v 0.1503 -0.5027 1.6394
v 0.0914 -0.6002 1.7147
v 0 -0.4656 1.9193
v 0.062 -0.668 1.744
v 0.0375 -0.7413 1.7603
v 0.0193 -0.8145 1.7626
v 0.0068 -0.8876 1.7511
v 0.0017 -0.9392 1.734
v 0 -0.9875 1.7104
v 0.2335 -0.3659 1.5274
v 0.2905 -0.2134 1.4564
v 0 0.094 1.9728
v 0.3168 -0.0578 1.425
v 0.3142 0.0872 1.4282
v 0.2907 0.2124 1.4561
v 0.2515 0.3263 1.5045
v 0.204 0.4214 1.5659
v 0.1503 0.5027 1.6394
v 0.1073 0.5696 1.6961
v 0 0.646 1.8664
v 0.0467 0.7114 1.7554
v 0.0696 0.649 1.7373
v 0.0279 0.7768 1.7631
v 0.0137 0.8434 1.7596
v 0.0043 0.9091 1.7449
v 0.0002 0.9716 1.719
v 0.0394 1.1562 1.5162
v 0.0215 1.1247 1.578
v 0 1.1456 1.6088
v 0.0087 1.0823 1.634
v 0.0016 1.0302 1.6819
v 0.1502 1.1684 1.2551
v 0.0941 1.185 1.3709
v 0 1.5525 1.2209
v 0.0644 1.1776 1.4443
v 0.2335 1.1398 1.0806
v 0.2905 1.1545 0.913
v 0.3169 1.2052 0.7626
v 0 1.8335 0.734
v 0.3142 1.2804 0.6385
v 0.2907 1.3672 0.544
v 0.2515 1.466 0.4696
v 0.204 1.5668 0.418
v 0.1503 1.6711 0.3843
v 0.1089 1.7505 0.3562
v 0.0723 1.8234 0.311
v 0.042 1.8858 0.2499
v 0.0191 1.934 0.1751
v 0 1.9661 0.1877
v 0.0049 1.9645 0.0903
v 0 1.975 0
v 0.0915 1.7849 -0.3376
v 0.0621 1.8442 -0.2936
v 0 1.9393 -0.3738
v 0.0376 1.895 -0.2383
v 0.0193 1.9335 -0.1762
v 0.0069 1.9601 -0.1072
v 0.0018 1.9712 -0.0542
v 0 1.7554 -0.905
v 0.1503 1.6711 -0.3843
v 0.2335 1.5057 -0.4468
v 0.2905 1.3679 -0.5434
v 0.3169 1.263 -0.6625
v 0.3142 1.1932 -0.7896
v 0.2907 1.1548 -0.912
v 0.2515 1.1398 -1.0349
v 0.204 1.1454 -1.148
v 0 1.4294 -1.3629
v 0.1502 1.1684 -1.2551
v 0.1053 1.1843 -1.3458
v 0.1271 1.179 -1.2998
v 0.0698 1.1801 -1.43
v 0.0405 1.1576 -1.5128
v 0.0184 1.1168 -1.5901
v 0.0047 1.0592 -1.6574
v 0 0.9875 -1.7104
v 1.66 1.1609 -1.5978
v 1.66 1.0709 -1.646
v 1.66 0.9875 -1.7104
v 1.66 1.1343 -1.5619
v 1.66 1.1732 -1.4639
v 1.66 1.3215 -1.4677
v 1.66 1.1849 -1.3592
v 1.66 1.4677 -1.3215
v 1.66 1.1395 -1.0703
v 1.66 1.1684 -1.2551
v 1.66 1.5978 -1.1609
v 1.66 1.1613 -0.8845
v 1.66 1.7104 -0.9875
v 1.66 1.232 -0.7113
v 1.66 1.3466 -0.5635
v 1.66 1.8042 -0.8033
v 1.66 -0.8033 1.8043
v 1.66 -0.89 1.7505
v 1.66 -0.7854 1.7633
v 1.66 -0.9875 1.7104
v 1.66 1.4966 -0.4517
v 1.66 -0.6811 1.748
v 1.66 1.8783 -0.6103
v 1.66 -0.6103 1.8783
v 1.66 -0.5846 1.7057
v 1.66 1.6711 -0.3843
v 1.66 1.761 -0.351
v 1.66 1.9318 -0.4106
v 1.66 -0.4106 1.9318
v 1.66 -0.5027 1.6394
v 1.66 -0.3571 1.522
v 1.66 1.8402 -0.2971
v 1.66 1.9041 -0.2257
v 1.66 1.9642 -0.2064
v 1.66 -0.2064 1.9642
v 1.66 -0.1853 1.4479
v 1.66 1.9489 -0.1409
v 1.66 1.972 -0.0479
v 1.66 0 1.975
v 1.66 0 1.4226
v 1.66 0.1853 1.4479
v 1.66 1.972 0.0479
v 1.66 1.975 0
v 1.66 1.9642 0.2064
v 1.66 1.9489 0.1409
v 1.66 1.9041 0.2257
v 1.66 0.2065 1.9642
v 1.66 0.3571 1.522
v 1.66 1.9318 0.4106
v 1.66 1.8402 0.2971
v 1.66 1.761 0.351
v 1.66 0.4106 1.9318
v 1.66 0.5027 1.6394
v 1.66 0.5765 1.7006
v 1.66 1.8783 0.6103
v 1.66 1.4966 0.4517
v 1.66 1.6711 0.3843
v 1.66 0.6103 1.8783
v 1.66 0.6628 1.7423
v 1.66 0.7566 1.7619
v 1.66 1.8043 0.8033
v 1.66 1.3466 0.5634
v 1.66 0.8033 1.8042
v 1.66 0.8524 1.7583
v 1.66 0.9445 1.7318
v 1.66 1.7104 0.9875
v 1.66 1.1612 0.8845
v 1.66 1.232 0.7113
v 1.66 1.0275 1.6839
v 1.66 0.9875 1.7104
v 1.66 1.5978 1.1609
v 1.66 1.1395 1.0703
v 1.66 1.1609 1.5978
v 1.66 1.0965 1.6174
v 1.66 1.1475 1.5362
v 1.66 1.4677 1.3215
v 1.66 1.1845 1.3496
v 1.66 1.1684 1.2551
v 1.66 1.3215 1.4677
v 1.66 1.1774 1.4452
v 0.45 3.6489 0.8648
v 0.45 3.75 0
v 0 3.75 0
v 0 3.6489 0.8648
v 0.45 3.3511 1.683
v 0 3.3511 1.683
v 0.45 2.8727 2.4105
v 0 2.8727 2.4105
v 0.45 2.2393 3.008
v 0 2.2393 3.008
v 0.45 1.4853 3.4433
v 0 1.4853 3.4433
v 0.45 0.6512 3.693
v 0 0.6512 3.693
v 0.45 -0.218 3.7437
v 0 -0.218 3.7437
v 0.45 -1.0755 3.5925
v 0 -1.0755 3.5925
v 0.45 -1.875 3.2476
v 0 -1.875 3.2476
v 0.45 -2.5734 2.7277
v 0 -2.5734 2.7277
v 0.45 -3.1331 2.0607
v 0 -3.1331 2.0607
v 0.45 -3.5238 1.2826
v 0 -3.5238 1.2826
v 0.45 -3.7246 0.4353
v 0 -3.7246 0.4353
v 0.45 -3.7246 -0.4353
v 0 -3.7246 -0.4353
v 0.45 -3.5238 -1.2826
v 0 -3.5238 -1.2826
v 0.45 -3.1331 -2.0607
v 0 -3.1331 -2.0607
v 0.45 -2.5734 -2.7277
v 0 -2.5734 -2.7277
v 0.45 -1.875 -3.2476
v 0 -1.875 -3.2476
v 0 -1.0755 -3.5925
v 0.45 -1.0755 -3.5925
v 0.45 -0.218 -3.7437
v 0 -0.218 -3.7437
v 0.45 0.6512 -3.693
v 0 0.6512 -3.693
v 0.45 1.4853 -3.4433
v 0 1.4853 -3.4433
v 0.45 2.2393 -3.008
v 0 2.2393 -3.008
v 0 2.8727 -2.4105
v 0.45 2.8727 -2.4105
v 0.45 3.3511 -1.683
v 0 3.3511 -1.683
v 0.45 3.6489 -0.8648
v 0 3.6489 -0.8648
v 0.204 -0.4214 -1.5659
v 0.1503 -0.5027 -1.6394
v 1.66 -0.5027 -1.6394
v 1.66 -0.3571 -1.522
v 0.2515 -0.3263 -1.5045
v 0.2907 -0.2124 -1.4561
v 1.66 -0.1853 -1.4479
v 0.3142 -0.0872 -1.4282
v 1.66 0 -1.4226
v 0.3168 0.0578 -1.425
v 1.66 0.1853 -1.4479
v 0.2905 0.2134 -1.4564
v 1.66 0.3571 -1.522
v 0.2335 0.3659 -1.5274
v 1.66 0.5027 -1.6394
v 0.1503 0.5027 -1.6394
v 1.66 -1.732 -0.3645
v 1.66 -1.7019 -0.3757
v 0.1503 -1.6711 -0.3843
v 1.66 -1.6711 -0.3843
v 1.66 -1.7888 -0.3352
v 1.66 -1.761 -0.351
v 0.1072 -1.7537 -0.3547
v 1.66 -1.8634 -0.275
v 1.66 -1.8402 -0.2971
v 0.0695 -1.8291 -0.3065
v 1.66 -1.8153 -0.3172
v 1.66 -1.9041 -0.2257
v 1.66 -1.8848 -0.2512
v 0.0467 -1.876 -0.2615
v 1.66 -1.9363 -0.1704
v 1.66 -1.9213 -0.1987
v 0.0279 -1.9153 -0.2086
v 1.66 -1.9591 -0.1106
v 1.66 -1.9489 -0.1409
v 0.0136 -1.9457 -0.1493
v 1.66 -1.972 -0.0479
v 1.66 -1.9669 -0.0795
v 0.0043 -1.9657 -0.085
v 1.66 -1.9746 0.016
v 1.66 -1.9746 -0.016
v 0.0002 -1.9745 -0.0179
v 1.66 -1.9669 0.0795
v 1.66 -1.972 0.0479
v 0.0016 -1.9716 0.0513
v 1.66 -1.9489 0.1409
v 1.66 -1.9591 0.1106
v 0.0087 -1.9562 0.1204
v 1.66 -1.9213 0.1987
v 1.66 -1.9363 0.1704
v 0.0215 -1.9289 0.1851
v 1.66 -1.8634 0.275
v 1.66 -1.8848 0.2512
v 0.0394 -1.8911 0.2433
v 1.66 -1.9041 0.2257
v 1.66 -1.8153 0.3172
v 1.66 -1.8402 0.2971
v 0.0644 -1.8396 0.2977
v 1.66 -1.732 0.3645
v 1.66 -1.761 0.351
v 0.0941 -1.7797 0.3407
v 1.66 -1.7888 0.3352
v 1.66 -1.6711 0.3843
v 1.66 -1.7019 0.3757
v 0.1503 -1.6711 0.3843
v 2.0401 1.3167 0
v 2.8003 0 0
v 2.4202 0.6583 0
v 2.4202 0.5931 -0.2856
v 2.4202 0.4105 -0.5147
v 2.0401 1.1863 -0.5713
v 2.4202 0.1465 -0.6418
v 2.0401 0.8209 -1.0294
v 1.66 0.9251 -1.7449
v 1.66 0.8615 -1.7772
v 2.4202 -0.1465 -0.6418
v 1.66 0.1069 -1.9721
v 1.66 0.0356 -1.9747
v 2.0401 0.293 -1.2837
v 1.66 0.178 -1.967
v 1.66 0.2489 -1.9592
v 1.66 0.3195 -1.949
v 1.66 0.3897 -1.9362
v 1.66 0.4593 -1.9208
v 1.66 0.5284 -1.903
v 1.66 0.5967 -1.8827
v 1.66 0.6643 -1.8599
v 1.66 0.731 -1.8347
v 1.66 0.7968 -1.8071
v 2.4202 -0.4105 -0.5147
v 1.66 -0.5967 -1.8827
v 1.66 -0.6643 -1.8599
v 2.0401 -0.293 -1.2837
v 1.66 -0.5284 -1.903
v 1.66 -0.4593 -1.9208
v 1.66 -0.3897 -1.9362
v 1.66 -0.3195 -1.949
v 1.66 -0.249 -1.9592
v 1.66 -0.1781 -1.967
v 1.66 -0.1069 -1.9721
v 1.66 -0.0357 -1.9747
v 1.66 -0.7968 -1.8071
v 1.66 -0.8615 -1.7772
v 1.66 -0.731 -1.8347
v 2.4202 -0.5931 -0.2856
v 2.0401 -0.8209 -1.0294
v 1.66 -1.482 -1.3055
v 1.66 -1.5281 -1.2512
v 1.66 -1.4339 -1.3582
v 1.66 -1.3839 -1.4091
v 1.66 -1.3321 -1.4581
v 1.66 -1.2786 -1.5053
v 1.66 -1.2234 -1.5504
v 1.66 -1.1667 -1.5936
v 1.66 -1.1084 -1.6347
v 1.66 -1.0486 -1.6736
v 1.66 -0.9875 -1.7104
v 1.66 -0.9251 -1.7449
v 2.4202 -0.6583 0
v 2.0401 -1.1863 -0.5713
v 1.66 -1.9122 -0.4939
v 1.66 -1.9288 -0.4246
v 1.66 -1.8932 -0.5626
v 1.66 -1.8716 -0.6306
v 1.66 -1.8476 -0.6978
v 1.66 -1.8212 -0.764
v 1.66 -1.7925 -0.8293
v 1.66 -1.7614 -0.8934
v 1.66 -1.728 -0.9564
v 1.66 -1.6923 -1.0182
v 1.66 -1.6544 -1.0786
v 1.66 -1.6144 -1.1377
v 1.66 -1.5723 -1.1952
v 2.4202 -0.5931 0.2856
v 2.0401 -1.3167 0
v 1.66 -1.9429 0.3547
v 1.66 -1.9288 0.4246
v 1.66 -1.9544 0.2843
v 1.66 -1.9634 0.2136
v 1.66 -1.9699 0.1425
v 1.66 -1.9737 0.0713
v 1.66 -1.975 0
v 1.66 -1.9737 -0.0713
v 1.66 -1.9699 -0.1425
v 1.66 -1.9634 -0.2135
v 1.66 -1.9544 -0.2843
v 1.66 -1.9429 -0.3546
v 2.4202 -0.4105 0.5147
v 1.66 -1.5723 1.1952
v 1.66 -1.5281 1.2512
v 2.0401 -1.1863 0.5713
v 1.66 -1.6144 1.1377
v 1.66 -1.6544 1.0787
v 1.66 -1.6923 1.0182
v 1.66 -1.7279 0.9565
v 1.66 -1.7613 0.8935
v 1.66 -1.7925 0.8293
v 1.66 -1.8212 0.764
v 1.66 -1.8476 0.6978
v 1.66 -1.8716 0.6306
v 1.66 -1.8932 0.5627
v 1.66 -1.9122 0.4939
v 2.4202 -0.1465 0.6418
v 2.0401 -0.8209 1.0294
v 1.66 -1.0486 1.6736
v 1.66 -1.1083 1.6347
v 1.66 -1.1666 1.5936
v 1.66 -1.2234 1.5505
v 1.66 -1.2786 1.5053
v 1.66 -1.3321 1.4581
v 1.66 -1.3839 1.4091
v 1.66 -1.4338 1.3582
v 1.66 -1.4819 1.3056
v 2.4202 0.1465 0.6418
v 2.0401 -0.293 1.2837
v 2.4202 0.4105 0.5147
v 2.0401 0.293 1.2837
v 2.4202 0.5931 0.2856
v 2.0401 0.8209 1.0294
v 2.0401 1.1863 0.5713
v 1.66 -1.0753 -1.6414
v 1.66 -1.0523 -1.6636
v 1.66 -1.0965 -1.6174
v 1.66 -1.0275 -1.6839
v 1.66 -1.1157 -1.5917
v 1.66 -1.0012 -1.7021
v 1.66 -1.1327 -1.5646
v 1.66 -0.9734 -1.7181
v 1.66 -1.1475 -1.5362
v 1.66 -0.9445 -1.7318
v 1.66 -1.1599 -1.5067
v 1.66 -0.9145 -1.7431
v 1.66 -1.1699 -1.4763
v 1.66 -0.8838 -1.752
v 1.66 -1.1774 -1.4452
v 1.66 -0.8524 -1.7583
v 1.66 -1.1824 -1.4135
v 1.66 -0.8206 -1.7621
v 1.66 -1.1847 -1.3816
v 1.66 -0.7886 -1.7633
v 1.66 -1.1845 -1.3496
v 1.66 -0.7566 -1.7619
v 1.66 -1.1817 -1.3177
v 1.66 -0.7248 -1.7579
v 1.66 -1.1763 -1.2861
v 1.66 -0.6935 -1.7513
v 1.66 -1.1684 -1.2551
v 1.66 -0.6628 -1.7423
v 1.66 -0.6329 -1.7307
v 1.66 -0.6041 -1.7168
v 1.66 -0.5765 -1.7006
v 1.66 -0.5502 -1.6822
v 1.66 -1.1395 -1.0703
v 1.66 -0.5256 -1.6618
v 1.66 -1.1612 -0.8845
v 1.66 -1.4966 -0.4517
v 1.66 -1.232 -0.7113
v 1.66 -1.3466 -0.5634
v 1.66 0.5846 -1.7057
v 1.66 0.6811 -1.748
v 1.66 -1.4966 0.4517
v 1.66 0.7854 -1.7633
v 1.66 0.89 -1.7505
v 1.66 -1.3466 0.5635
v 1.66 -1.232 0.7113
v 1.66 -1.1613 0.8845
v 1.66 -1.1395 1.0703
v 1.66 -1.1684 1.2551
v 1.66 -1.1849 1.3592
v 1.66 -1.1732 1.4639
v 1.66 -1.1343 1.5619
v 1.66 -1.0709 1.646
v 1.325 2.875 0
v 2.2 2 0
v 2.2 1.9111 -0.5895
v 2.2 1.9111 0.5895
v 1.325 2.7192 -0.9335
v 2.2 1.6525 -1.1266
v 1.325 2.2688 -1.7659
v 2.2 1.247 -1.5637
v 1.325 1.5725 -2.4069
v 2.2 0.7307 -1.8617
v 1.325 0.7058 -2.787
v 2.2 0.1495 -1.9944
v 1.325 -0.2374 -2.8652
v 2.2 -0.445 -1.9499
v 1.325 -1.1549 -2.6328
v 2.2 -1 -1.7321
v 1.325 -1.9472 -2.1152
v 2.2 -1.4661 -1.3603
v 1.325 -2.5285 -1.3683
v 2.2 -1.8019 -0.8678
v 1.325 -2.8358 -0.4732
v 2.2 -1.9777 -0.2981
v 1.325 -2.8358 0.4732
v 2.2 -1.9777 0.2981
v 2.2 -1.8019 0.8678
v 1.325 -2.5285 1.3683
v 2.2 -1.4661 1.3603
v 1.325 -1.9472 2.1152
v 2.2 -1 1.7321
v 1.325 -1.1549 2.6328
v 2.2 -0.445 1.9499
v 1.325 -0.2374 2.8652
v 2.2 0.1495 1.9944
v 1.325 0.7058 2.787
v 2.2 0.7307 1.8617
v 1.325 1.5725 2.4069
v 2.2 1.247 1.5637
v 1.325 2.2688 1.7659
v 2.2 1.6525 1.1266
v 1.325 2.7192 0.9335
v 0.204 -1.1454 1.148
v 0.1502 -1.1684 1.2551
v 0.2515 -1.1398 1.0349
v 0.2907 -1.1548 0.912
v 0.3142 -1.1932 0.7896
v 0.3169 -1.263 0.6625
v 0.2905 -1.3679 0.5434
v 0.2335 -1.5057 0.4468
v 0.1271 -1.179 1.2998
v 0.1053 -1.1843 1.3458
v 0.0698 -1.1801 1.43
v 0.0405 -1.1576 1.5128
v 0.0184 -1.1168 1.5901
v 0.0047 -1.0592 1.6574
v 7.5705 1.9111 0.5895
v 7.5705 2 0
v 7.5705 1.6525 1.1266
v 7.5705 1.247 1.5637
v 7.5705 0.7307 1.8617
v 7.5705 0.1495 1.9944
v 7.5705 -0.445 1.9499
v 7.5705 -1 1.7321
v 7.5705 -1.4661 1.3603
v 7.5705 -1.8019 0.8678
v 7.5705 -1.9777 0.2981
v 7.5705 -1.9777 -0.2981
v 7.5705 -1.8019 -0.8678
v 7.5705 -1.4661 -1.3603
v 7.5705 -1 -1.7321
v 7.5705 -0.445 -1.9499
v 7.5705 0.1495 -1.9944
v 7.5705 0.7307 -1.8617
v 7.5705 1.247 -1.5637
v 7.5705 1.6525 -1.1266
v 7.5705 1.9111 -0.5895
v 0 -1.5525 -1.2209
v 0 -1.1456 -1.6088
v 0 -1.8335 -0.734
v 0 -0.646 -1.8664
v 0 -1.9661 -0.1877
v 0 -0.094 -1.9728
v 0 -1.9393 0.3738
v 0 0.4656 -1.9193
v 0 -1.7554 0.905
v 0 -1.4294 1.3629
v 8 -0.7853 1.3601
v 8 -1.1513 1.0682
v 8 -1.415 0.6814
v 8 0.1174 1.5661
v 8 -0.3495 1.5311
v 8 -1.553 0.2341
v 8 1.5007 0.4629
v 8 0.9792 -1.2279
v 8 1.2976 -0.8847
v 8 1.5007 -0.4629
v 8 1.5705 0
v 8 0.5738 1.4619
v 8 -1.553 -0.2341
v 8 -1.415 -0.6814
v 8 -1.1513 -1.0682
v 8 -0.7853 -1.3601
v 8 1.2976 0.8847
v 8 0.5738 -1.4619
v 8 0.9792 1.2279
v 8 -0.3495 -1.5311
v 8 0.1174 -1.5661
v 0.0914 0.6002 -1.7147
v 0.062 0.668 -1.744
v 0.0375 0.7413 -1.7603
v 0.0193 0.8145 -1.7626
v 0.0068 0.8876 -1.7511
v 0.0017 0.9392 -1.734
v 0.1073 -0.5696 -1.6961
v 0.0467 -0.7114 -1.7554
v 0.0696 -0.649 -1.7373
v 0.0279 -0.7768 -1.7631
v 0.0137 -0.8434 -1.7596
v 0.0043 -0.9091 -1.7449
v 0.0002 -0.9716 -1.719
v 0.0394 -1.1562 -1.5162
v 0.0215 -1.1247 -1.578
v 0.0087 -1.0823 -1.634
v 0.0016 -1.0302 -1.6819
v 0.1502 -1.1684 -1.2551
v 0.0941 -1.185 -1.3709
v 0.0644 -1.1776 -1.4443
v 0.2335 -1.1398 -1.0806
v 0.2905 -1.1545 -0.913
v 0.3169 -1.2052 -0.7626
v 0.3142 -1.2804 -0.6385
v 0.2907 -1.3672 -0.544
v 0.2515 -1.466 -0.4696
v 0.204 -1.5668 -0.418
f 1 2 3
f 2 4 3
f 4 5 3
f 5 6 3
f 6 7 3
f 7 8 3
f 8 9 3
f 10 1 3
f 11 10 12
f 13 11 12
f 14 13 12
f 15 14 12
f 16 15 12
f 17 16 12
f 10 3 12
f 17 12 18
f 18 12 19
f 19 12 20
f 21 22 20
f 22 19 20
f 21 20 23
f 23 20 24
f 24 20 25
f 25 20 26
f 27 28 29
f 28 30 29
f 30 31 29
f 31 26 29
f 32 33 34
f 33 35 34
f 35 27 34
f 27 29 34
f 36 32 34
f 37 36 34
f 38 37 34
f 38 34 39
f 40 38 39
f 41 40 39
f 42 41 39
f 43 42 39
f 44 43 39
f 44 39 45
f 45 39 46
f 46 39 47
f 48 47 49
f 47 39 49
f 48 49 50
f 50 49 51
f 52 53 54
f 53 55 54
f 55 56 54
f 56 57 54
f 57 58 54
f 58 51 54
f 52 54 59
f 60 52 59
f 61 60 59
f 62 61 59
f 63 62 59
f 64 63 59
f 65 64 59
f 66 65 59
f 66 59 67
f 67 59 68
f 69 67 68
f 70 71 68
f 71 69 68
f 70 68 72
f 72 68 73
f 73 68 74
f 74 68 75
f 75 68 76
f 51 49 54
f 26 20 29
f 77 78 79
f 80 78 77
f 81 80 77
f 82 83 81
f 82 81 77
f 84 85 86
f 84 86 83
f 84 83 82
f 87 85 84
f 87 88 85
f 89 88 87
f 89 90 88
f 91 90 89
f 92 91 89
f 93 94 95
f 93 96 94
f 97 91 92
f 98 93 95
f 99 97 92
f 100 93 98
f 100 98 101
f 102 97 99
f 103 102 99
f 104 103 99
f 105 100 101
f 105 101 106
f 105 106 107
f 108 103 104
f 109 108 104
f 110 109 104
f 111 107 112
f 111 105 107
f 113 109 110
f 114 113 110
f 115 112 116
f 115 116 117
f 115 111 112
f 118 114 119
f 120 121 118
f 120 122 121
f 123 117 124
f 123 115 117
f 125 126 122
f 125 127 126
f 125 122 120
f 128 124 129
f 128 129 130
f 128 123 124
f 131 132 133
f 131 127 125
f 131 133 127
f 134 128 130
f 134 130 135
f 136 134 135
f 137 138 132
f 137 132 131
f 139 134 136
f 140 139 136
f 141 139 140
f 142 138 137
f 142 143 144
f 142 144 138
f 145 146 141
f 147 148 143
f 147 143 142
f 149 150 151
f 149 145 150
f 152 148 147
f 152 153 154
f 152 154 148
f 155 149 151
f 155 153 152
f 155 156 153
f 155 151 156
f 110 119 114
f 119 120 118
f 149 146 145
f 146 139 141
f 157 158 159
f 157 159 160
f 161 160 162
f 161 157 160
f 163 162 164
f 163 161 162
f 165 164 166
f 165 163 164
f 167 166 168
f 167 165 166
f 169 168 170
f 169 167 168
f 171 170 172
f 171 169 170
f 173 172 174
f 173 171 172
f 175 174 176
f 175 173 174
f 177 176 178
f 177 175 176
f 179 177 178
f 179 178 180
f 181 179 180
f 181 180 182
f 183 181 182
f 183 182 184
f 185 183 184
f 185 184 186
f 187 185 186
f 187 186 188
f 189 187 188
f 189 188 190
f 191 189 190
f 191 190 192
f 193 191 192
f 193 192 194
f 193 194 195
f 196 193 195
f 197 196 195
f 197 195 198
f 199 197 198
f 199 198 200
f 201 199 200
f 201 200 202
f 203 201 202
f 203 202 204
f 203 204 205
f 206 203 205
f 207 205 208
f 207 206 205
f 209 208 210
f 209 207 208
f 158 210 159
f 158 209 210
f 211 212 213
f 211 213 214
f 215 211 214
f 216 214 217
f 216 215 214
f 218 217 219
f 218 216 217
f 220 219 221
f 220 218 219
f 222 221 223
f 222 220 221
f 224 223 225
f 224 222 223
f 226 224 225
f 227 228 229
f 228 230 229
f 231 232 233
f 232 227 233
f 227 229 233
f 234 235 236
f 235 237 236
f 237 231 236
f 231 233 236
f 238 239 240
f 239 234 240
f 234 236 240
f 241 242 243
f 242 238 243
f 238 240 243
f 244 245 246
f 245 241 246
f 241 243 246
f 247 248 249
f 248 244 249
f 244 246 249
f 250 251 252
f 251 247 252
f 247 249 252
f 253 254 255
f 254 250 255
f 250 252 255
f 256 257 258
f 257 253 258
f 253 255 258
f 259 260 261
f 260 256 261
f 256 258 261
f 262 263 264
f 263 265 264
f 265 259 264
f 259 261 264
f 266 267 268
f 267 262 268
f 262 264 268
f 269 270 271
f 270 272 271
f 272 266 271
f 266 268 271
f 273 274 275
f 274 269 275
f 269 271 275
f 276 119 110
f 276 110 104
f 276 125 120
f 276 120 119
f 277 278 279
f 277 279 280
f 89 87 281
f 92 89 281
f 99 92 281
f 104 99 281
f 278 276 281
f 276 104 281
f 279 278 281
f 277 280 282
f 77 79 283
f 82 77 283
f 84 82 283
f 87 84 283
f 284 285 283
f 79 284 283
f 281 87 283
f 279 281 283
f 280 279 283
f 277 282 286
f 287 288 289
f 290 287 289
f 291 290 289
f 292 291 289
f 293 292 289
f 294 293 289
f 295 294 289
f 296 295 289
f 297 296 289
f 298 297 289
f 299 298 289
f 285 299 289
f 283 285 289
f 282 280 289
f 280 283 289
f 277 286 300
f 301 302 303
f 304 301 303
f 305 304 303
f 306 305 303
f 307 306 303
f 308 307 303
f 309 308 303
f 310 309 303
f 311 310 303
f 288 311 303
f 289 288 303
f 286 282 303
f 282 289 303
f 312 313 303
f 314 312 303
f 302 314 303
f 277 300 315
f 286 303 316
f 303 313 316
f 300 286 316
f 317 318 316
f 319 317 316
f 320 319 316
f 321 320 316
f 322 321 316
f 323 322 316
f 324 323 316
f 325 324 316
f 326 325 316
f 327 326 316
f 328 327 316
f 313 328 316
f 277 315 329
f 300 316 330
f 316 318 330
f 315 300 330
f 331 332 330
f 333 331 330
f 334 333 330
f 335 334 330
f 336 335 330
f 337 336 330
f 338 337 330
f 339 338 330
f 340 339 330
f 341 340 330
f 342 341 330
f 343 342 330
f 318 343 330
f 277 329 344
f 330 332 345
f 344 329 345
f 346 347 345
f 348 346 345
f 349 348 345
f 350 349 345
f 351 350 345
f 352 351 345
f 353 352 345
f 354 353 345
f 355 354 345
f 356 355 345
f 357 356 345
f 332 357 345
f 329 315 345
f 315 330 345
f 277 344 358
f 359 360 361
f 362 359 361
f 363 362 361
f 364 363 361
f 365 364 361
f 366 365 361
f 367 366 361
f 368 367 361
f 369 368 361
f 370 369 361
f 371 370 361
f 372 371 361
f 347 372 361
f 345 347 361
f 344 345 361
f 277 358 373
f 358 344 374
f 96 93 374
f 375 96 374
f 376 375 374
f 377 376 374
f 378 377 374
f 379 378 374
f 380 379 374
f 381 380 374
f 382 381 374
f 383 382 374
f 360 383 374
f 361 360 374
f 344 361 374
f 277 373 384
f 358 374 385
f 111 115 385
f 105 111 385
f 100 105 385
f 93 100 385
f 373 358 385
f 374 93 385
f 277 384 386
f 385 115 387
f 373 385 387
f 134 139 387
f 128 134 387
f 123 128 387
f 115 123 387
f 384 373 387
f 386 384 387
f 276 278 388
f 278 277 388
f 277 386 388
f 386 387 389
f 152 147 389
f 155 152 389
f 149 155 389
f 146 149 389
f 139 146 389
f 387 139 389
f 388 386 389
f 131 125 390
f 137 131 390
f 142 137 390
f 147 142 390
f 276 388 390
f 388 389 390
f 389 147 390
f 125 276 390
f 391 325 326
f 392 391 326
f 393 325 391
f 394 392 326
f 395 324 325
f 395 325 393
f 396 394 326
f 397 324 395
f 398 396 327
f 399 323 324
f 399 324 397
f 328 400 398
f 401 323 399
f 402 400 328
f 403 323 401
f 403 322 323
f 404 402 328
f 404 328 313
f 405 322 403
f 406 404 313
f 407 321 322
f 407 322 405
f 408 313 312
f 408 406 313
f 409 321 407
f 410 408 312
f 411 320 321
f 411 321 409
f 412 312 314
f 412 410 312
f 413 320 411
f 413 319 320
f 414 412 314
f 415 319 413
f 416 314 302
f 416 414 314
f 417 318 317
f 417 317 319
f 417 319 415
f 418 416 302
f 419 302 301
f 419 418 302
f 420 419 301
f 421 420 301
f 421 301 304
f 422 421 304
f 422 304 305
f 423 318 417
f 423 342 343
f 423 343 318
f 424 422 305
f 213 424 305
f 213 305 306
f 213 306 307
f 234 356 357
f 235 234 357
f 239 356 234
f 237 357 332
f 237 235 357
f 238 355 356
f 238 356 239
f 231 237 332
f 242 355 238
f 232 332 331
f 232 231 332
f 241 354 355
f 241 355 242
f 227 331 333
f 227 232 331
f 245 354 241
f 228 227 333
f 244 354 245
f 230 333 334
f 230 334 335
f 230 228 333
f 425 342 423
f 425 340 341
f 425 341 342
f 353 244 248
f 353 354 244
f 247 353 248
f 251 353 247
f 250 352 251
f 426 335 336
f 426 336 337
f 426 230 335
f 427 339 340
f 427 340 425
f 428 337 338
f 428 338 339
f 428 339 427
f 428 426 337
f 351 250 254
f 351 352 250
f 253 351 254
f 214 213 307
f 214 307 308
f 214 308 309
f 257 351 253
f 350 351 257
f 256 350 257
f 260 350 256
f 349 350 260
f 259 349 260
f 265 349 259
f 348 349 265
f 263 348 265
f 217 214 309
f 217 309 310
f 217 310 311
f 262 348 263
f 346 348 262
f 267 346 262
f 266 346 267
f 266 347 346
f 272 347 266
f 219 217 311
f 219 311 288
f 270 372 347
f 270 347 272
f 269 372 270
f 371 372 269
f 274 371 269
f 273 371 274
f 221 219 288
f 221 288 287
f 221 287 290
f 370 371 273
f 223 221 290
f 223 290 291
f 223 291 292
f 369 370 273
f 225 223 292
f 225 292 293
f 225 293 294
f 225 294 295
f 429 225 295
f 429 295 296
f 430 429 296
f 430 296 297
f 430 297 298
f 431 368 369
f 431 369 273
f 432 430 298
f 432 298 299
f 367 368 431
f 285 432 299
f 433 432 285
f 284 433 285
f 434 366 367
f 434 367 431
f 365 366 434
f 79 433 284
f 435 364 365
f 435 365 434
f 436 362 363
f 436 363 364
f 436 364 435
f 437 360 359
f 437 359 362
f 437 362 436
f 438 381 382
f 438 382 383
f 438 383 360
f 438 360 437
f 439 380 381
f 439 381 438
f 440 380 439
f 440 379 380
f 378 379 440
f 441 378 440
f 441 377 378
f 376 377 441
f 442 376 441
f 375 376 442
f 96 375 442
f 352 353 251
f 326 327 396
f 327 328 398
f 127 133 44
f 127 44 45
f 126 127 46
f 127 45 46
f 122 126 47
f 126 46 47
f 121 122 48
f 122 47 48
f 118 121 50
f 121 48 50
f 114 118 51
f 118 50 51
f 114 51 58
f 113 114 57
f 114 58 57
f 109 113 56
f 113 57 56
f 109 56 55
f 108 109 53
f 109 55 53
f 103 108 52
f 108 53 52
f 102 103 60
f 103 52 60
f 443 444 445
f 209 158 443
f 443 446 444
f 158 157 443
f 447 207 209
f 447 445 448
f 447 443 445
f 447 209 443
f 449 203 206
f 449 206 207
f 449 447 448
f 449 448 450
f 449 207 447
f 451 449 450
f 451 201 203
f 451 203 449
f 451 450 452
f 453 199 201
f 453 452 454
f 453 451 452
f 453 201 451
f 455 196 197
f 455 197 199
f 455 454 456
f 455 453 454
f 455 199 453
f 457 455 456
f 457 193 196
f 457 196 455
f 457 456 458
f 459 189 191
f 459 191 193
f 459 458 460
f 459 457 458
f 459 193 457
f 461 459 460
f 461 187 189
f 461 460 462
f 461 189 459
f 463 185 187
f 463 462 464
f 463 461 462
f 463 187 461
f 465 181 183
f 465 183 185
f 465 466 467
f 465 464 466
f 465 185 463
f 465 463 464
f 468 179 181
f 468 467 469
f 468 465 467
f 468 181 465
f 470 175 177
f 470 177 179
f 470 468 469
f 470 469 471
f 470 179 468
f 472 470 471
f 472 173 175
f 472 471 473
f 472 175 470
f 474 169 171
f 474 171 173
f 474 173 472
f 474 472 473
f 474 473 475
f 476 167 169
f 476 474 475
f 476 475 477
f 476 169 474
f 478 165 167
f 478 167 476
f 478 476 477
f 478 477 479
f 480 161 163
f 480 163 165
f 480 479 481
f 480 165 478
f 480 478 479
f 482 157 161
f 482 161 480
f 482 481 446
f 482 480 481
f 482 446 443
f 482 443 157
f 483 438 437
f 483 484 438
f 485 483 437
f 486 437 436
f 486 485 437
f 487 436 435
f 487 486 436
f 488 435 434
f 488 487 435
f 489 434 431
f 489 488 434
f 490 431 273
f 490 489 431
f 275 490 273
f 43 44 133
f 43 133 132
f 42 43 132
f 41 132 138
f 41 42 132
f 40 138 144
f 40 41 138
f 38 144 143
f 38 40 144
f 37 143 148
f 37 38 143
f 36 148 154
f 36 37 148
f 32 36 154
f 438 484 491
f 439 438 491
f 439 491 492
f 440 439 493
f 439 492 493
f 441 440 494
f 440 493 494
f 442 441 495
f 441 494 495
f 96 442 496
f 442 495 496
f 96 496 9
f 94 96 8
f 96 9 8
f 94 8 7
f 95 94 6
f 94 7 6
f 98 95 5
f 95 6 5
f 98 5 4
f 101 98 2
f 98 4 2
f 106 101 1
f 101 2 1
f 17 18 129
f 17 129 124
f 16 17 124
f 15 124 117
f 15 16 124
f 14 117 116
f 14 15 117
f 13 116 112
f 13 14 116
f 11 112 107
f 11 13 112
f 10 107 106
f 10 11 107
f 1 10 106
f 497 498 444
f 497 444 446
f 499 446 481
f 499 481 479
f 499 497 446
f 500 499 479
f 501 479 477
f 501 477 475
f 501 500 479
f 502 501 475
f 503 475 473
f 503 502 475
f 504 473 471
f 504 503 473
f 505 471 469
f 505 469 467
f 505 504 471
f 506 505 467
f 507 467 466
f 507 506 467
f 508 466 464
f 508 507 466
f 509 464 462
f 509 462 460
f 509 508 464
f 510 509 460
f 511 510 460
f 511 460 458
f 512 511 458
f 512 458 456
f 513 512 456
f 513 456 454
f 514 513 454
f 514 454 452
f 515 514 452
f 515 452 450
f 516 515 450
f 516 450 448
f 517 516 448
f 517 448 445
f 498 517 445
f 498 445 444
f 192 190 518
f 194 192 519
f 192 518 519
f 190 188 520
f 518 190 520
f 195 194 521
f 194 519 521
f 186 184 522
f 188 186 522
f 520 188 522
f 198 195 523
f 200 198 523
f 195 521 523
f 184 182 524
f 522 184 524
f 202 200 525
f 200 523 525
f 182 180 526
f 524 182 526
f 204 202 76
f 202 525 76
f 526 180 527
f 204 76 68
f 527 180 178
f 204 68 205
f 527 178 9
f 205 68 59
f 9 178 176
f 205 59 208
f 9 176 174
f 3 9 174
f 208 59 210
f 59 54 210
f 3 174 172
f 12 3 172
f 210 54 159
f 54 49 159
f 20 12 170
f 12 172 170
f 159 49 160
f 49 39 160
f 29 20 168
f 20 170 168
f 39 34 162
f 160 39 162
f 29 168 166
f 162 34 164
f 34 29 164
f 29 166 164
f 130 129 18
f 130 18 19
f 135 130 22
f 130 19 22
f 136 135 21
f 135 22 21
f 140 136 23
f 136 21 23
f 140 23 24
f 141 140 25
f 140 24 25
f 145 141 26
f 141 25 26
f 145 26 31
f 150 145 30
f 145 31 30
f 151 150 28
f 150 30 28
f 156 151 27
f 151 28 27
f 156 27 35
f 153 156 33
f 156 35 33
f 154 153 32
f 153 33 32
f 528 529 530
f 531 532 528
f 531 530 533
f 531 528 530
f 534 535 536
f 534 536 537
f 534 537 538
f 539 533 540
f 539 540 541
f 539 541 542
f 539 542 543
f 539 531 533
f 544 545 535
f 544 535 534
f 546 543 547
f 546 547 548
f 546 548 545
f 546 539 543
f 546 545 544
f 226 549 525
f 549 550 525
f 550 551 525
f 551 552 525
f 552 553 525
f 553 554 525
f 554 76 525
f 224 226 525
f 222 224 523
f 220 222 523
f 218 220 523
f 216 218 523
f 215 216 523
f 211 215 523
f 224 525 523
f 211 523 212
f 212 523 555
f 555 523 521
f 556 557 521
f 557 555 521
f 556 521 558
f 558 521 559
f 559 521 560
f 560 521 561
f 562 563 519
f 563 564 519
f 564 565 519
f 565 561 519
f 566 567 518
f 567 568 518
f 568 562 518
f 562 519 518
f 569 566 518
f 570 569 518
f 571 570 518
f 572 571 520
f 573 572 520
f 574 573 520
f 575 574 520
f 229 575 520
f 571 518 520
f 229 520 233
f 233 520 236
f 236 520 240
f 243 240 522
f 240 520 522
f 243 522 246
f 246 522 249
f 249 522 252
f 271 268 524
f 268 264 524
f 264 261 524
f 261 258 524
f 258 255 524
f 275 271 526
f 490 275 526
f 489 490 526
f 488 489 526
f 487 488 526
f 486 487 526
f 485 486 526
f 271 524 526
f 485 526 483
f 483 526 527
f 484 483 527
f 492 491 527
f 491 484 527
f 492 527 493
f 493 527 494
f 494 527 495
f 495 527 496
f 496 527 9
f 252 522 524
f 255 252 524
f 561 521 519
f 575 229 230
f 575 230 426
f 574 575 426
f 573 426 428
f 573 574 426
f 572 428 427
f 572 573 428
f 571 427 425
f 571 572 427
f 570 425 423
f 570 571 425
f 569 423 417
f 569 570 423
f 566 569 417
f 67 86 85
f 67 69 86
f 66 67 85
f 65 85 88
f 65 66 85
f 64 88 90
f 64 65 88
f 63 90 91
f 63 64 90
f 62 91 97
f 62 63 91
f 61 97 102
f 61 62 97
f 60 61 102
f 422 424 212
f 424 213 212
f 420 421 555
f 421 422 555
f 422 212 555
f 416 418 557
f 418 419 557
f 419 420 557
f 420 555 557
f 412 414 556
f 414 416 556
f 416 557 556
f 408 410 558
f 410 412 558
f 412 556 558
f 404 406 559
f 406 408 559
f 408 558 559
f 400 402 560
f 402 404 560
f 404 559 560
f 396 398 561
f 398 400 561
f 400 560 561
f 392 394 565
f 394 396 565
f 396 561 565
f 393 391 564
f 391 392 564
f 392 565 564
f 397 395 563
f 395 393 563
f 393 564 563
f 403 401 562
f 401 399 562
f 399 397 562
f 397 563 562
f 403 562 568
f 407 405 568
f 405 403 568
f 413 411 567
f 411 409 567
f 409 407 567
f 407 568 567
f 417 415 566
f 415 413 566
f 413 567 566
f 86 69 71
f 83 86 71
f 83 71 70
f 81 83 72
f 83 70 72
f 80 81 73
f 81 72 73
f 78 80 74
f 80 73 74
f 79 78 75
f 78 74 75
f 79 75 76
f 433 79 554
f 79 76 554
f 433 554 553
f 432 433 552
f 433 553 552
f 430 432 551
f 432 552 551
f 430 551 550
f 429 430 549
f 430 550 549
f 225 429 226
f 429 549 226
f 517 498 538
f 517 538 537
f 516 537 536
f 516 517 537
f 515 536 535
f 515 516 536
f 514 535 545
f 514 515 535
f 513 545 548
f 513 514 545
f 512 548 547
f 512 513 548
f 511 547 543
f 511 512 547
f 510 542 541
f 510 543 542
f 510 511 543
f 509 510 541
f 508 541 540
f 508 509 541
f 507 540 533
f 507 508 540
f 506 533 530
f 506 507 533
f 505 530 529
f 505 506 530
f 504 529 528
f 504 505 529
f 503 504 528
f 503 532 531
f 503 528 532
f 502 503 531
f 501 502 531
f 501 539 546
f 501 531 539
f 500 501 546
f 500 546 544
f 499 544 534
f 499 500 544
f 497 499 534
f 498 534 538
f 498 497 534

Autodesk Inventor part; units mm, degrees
sketch "Skizze_5" plane through (0, 0, 0) normal (0, 0, 1) x (1, 0, 0)
  line L0 (8, 0) -> (0, 0)
  line L1 (0, 0) -> (0, 3.75)
  line L2 (0, 3.75) -> (0.45, 3.75)
  line L3 (0.45, 3.75) -> (2.2, 2)
  line L4 (2.2, 2) -> (7.5705, 2)
  line L5 (7.5705, 2) -> (8, 1.5705)
  line L6 (8, 1.5705) -> (8, 0)
  line L7 (8, 0) -> (0, 0)
revolve "Revolution1" add sketch "Skizze_5" angle 360 about axis through (8, 0, 0) along (1, 0, 0)
thread "Thread1" size "M4x0.7" class "6g" standard "ISO Metric profile" length 3.9705
sketch "Sketch_1" plane through (0, 0, 0) normal (0, 0, 1) x (1, 0, 0)
  line L0 (1.66, 0) -> (0, 0)
  line L1 (0, 0) -> (0, 1.975)
  line L2 (0, 1.975) -> (1.66, 1.975)
  line L3 (1.66, 1.975) -> (1.66, 0)
  line L4 (1.66, 0) -> (0, 0)
revolve "Revolution2" cut sketch "Sketch_1" angle 360 about axis through (1.66, 0, 0) along (1, 0, 0)
sketch "Sketch_2" plane through (0, 0, 0) normal (0, 0, 1) x (1, 0, 0)
  line L0 (2.8003, 0) -> (1.66, 0)
  line L1 (1.66, 0) -> (1.66, 1.975)
  line L2 (1.66, 1.975) -> (2.8003, 0)
  line L3 (2.8003, 0) -> (1.66, 0)
revolve "Revolution3" cut sketch "Sketch_2" angle 360 about axis through (2.8003, 0, 0) along (1, 0, 0)
sketch "Sketch_3" plane through (0, 0, 0) normal (1, 0, 0) x (0, 1, 0)
  circle A0 centre (0, 0) radius 2.37
  arc A1 (-0.5027, 1.6394) -> (-1.1684, 1.2551) centre (-0.79, 1.3683) ccw
  arc A2 (-1.6711, 0.3843) -> (-1.1684, 1.2551) centre (-1.8307, 1.0569) ccw
  arc A3 (-1.6711, 0.3843) -> (-1.6711, -0.3843) centre (-1.58, 0) ccw
  arc A4 (-1.1684, -1.2551) -> (-1.6711, -0.3843) centre (-1.8307, -1.0569) ccw
  arc A5 (-1.1684, -1.2551) -> (-0.5027, -1.6394) centre (-0.79, -1.3683) ccw
  arc A6 (0.5027, -1.6394) -> (-0.5027, -1.6394) centre (0, -2.1139) ccw
  arc A7 (0.5027, -1.6394) -> (1.1684, -1.2551) centre (0.79, -1.3683) ccw
  arc A8 (1.6711, -0.3843) -> (1.1684, -1.2551) centre (1.8307, -1.0569) ccw
  arc A9 (1.6711, -0.3843) -> (1.6711, 0.3843) centre (1.58, 0) ccw
  arc A10 (1.1684, 1.2551) -> (1.6711, 0.3843) centre (1.8307, 1.0569) ccw
  arc A11 (1.1684, 1.2551) -> (0.5027, 1.6394) centre (0.79, 1.3683) ccw
  arc A12 (-0.5027, 1.6394) -> (0.5027, 1.6394) centre (0, 2.1139) ccw
extrude "Extrusion1" add sketch "Sketch_3" along normal blind 1.66
sketch "Sketch_4" plane through (0, 0, 0) normal (0, 0, 1) x (1, 0, 0)
  line L0 (1.1403, 0) -> (-1.66, 0)
  line L1 (-1.66, 0) -> (-1.66, 1.975)
  line L2 (-1.66, 1.975) -> (0, 1.975)
  line L3 (0, 1.975) -> (1.1403, 0)
  line L4 (1.1403, 0) -> (-1.66, 0)
revolve "Revolution4" cut sketch "Sketch_4" angle 360 about axis through (1.1403, 0, 0) along (1, 0, 0)
ref_plane "IP1_XY" through (0, 0, 0) normal (1, 0, 0) x (0, 0, -1)
ref_plane "IP1_YZ" through (0, 0, 0) normal (0, 0, -1) x (0, 1, 0)
ref_plane "IP1_ZX" through (0, 0, 0) normal (0, 1, 0) x (1, 0, 0)
ref_plane "IP2_XY" through (2.2, 0, 0) normal (1, 0, 0) x (0, 0, -1)
ref_plane "IP2_YZ" through (2.2, 0, 0) normal (0, 0, -1) x (0, 1, 0)
ref_plane "IP2_ZX" through (2.2, 0, 0) normal (0, 1, 0) x (1, 0, 0)
ref_plane "IP3_XY" through (8, 0, 0) normal (1, 0, 0) x (0, 0, -1)
ref_plane "IP3_YZ" through (8, 0, 0) normal (0, 0, -1) x (0, 1, 0)
ref_plane "IP3_ZX" through (8, 0, 0) normal (0, 1, 0) x (1, 0, 0)
properties part number "Senkschraube DIN ≈965 M4x8 51305.040.008(High)"
